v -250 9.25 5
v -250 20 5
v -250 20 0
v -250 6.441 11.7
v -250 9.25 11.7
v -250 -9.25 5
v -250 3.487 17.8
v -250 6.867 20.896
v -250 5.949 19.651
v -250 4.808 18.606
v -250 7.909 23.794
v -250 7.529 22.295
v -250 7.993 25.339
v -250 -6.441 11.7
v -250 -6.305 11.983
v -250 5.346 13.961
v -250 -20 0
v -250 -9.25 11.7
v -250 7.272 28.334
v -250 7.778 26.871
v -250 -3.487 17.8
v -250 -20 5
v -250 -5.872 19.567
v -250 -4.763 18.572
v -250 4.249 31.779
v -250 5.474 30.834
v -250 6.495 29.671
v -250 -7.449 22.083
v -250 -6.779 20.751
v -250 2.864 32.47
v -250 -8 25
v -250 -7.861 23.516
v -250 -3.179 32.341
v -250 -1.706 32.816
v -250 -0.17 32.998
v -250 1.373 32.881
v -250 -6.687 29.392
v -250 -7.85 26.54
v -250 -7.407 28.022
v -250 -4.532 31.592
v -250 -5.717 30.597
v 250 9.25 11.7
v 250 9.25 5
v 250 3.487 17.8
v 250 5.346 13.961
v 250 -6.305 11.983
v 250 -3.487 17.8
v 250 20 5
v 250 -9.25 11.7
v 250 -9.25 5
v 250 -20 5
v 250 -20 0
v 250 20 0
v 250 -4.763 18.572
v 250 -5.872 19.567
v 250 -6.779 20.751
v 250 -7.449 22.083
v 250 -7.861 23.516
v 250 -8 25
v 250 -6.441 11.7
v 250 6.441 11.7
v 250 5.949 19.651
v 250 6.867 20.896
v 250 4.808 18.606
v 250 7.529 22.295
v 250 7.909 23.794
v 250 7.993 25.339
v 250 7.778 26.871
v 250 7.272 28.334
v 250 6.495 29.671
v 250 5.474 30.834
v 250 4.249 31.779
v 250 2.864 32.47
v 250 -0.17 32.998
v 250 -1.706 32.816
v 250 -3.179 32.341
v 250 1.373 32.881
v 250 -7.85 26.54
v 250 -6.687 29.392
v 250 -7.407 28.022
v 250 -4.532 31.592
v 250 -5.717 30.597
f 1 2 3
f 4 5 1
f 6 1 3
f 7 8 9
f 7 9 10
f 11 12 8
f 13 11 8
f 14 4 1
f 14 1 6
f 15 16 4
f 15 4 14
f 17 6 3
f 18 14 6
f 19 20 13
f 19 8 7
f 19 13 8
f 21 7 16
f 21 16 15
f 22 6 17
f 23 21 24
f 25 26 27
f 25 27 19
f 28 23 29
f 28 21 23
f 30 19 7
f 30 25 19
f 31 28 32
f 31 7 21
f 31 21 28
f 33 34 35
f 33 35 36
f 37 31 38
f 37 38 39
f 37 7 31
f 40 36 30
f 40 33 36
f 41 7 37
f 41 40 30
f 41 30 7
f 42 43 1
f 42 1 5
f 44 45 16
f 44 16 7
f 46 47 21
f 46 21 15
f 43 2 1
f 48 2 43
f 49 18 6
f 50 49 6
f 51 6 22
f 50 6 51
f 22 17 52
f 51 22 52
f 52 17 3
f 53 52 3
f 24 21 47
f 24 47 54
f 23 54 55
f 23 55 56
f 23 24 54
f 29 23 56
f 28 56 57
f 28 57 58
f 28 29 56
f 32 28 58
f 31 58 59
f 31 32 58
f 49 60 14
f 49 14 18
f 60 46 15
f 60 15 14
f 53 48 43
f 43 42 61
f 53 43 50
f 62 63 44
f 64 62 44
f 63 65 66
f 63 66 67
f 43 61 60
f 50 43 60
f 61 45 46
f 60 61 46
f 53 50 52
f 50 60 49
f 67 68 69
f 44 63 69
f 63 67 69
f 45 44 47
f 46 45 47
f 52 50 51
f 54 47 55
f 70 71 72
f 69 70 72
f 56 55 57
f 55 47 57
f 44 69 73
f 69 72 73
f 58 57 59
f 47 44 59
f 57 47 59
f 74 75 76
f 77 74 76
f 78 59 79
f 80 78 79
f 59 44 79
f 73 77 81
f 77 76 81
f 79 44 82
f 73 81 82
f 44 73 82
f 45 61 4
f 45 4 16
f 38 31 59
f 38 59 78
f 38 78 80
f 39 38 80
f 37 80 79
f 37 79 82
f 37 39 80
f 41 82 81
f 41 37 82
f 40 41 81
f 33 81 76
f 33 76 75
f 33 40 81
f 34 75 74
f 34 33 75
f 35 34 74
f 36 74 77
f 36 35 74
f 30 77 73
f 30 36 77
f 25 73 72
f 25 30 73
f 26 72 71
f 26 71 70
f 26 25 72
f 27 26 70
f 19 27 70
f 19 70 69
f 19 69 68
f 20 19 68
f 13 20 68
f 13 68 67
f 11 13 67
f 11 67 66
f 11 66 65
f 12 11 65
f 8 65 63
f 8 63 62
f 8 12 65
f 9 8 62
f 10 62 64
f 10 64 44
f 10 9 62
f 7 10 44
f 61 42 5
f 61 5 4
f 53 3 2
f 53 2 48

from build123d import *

# Parameters (mm, degrees)
F0_W     = 500
F0_H     = 40
F1_DEPTH = 5
F3_DEPTH = 500
F5_DEPTH = 500


with BuildPart() as f1:
    # F0 (on Top) → F1 (new body)
    with BuildSketch(Plane.XY):
        Rectangle(F0_W, F0_H)
    extrude(amount=F1_DEPTH)

    # F2 (on face) → F3 (join, through all)
    with BuildSketch(Plane.YZ.offset(250)):
        Polygon((-9.25, 11.7), (-9.25, 0), (9.25, 0), (9.25, 11.7), (6.4414839943, 11.7), (-6.4414839943, 11.7), align=None)
        with BuildLine():
            Line((-6.3045076751, 11.9828207053), (-6.4414839943, 11.7))
            Line((-6.4414839943, 11.7), (6.4414839943, 11.7))
            Line((6.4414839943, 11.7), (5.346455176, 13.9609515597))
            Line((5.346455176, 13.9609515597), (3.4871191548, 17.8))
            ThreePointArc((3.4871191548, 17.8), (0, 17), (-3.4871191548, 17.8))
            Line((-3.4871191548, 17.8), (-6.3045076751, 11.9828207053))
        make_face()
    extrude(amount=-F3_DEPTH)

    # F4 (on face) → F5 (join, through all)
    with BuildSketch(Plane(origin=(-250, 0, 0), x_dir=(0, -1, 0), z_dir=(-1, 0, 0))):
        with BuildLine():
            ThreePointArc((3.4871191548, 17.8), (6.7785305649, 20.7512915632), (8, 25))
            ThreePointArc((8, 25), (-4.2487084368, 31.7785305649), (-3.4871191548, 17.8))
            ThreePointArc((-3.4871191548, 17.8), (0, 17), (3.4871191548, 17.8))
        make_face()
    extrude(amount=-F5_DEPTH)


solid = f1.part
